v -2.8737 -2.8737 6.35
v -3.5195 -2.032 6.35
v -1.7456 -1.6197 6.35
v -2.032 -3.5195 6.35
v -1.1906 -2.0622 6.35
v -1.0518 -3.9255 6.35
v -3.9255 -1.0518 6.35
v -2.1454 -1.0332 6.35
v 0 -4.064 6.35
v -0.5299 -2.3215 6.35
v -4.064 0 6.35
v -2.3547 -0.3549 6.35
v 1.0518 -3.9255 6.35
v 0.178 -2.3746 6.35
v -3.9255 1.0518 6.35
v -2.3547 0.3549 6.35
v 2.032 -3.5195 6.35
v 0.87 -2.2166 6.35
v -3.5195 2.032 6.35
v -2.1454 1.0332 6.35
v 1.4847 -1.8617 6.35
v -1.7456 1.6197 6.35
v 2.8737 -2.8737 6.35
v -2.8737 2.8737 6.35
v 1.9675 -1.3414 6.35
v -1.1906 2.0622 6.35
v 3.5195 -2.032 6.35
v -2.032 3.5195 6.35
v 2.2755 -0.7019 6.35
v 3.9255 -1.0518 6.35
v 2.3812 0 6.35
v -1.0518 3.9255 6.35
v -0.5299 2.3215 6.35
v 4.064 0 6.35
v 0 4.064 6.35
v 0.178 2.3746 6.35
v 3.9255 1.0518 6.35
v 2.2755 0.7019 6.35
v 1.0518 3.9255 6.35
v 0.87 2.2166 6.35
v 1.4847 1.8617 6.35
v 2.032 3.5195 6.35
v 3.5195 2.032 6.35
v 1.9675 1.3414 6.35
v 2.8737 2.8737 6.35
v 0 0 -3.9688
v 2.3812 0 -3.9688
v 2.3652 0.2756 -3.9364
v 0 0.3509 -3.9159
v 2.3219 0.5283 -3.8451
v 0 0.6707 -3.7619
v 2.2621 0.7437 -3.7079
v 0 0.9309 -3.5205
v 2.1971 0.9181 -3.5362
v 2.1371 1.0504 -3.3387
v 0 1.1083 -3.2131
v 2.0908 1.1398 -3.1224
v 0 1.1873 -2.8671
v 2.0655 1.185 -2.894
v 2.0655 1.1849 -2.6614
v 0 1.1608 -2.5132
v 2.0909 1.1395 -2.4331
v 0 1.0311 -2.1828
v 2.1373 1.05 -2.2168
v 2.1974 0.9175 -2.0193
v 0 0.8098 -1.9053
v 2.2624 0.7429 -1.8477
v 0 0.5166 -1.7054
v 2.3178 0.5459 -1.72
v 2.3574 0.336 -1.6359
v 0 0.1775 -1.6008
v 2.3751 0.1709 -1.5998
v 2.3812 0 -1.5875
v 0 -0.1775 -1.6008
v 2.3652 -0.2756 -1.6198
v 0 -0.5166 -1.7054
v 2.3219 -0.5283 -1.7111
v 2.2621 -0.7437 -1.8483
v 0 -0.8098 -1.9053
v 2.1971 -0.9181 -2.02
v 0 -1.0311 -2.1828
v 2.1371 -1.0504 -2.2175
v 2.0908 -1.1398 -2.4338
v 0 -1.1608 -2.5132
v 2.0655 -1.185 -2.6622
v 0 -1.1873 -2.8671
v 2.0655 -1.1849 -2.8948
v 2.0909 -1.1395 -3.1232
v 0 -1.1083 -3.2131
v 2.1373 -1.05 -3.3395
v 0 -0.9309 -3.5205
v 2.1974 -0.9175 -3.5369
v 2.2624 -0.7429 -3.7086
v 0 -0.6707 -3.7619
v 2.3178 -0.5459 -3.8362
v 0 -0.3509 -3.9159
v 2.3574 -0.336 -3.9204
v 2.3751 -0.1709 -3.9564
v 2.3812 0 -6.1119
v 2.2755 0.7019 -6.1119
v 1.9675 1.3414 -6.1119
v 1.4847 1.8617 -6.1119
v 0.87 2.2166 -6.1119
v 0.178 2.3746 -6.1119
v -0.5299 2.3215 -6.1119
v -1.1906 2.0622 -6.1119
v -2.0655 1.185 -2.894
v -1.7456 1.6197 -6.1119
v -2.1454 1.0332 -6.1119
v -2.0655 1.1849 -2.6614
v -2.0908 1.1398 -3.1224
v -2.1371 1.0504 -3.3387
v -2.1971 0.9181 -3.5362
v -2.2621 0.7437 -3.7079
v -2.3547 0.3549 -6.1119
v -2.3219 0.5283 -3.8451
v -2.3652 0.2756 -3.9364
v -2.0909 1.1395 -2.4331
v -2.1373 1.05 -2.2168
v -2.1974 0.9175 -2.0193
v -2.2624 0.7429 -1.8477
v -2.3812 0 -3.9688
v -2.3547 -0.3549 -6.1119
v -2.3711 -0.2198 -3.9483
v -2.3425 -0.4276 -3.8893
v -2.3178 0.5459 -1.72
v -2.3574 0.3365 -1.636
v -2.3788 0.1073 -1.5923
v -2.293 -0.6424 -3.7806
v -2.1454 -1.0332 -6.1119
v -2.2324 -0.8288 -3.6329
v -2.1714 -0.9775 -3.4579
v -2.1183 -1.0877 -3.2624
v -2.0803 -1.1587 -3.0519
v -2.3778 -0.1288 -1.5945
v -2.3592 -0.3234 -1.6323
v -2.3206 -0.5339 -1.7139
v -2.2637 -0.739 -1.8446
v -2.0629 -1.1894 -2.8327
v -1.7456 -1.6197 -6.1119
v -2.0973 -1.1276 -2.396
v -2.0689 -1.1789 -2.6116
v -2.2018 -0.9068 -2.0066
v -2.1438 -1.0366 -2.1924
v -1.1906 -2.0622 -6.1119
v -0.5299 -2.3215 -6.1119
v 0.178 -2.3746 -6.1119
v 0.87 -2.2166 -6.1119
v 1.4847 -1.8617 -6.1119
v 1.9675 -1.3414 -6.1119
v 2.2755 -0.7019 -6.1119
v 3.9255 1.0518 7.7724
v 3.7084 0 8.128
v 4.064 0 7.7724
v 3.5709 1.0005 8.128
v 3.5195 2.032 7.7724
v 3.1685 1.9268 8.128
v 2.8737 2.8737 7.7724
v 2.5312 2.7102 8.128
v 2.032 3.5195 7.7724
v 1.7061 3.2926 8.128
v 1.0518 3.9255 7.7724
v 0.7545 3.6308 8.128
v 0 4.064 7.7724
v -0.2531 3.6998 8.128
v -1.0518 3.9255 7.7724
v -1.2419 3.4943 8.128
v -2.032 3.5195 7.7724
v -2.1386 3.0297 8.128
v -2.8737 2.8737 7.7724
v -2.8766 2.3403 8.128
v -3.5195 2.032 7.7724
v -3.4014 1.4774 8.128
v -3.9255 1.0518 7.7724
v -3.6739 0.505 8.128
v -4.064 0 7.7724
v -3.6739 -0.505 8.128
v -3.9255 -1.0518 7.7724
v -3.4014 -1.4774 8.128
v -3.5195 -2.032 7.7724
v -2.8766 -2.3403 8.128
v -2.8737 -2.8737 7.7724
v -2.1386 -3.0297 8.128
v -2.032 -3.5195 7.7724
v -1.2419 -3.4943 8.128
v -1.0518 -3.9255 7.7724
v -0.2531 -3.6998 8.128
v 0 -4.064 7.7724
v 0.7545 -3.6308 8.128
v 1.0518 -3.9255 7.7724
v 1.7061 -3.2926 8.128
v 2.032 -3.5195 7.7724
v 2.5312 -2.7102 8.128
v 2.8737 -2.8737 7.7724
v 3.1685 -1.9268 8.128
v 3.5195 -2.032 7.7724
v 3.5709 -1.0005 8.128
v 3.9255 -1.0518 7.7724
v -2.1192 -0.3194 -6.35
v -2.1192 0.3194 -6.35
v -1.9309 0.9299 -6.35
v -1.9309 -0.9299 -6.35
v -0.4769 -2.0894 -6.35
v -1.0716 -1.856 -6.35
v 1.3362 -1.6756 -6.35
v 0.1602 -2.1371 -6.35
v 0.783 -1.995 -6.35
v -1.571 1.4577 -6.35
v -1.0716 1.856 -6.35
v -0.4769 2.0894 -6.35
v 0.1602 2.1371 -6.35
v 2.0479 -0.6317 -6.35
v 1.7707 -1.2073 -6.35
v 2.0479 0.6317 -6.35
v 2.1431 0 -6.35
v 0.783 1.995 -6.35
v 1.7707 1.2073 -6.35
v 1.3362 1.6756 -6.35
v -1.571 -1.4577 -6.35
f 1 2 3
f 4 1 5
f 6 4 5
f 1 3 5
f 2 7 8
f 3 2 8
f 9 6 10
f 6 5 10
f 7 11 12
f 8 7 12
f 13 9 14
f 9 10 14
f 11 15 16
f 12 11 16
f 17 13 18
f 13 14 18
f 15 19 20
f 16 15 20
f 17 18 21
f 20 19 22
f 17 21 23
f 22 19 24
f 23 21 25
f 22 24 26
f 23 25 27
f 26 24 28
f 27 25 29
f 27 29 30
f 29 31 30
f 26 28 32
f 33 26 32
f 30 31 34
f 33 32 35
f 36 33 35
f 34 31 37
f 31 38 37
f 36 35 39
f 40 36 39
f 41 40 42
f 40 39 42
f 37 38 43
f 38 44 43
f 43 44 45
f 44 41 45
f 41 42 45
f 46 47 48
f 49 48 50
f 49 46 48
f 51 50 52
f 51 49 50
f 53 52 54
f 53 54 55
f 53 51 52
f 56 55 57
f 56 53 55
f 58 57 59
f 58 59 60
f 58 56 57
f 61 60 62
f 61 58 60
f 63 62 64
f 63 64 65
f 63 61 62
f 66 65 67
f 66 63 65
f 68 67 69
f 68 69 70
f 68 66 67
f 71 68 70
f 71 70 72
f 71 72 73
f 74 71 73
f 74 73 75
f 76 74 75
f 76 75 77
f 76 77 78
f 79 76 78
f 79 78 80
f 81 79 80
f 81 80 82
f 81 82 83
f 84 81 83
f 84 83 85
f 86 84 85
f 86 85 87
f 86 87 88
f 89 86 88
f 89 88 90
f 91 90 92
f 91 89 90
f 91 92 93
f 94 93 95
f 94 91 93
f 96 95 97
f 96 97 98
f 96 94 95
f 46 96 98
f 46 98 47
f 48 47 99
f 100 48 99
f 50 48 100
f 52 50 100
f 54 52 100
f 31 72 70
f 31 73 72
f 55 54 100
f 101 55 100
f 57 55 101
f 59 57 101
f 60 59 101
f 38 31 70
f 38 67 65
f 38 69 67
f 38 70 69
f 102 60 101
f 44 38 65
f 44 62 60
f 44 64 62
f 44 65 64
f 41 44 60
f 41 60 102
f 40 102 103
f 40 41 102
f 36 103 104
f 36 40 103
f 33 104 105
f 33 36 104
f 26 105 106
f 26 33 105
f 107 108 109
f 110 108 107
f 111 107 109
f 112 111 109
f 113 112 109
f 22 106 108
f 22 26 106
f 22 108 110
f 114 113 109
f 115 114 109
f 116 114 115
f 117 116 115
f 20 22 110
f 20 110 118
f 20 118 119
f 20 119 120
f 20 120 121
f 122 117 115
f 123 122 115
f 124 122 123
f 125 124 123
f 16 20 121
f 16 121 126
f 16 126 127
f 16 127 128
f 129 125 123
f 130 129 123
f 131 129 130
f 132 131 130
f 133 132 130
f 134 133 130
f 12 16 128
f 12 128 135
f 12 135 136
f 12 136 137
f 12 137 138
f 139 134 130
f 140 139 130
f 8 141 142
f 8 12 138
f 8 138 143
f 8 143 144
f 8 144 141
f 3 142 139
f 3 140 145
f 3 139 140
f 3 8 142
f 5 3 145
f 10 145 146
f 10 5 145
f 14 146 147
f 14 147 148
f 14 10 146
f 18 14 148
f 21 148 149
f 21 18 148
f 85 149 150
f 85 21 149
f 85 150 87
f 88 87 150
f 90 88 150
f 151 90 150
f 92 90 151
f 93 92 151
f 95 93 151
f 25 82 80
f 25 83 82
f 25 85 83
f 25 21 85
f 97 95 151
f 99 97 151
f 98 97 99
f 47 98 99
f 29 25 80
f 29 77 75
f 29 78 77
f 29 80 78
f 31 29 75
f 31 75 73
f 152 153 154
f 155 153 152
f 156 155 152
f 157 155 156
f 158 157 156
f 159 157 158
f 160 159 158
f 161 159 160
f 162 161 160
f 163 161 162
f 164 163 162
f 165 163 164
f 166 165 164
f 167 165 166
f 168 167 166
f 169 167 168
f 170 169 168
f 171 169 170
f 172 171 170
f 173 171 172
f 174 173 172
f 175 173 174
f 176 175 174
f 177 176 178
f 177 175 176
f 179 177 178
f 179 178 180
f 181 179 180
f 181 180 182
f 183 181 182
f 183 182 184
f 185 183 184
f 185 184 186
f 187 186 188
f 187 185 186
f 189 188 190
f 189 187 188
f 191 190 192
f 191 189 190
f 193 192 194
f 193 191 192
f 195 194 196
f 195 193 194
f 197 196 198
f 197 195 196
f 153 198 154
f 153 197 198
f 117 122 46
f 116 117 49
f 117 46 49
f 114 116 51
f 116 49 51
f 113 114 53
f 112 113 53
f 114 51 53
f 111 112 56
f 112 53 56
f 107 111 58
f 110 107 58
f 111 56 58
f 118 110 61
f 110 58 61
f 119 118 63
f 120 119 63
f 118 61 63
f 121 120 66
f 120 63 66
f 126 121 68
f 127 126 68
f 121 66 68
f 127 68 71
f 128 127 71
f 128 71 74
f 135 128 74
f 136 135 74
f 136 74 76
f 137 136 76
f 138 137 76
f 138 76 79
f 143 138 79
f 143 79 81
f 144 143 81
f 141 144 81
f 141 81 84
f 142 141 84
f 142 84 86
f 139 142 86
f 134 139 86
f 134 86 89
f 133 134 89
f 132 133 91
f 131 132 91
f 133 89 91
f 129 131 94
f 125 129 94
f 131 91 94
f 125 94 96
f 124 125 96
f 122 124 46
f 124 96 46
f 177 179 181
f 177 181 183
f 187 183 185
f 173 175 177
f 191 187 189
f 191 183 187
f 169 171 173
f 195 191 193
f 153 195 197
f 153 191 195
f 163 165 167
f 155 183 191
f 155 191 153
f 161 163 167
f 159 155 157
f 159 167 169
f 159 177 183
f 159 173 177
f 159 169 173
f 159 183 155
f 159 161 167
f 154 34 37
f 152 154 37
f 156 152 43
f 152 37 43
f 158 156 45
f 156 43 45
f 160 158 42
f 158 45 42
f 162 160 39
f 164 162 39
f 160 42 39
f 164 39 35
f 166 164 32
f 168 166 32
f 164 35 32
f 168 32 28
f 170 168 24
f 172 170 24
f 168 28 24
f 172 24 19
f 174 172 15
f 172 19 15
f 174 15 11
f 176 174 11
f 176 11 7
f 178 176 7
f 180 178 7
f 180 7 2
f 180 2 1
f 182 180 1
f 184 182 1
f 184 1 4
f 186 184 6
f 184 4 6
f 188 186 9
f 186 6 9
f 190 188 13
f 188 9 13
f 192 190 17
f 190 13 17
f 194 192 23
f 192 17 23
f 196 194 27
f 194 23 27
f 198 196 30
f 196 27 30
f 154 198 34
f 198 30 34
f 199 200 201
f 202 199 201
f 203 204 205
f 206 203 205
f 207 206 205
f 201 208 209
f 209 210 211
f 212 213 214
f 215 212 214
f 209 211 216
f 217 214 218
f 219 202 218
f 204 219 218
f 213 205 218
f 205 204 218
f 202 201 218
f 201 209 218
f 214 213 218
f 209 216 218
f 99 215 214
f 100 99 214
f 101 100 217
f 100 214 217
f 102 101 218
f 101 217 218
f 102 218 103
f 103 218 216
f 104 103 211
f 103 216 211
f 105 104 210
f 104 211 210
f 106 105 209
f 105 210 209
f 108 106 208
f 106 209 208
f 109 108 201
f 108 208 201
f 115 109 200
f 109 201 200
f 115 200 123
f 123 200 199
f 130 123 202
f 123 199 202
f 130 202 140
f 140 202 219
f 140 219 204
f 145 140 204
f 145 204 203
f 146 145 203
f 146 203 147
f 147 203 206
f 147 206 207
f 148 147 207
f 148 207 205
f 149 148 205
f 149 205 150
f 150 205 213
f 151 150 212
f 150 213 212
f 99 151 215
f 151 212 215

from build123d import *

# Parameters (mm, degrees)
SKETCH1_R           = 2.38125
EXTRUDE1_DEPTH      = 6.35
SKETCH2_R           = 4.064
EXTRUDE2_DEPTH      = 1.778
CHAMFER1_SIZE       = 0.3556
SKETCH3_R           = 1.190625
EXTRUDE3_DEPTH      = 5.064
EXTRUDE3_DEPTH_BACK = 5.064
CHAMFER2_SIZE       = 0.238125


with BuildPart() as part:
    # Sketch1 → Extrude1 (new body, symmetric)
    with BuildSketch(Plane.XY):
        Circle(SKETCH1_R)
    extrude(amount=EXTRUDE1_DEPTH, both=True)

    # Sketch2 → Extrude2 (add)
    with BuildSketch(Plane.XY.offset(6.35)):
        Circle(SKETCH2_R)
    extrude(amount=EXTRUDE2_DEPTH)

    # Chamfer1
    chamfer1_edges = [part.edges().sort_by_distance(p)[0] for p in [
        (-4.064, 0, 8.128),
    ]]
    chamfer(chamfer1_edges, length=CHAMFER1_SIZE)

    # Sketch3 → Extrude3 (cut, two sides)
    with BuildSketch(Plane(origin=(0, 0, 0), x_dir=(0, 0, -1), z_dir=(1, 0, 0))) as extrude3_sk:
        with Locations((2.778125, 0)):
            Circle(SKETCH3_R)
    extrude(amount=EXTRUDE3_DEPTH, mode=Mode.SUBTRACT)
    extrude(extrude3_sk.sketch, amount=-EXTRUDE3_DEPTH_BACK, mode=Mode.SUBTRACT)

    # Chamfer2
    chamfer2_edges = [part.edges().sort_by_distance(p)[0] for p in [
        (-2.38125, 0, -6.35),
    ]]
    chamfer(chamfer2_edges, length=CHAMFER2_SIZE)


solid = part.part
